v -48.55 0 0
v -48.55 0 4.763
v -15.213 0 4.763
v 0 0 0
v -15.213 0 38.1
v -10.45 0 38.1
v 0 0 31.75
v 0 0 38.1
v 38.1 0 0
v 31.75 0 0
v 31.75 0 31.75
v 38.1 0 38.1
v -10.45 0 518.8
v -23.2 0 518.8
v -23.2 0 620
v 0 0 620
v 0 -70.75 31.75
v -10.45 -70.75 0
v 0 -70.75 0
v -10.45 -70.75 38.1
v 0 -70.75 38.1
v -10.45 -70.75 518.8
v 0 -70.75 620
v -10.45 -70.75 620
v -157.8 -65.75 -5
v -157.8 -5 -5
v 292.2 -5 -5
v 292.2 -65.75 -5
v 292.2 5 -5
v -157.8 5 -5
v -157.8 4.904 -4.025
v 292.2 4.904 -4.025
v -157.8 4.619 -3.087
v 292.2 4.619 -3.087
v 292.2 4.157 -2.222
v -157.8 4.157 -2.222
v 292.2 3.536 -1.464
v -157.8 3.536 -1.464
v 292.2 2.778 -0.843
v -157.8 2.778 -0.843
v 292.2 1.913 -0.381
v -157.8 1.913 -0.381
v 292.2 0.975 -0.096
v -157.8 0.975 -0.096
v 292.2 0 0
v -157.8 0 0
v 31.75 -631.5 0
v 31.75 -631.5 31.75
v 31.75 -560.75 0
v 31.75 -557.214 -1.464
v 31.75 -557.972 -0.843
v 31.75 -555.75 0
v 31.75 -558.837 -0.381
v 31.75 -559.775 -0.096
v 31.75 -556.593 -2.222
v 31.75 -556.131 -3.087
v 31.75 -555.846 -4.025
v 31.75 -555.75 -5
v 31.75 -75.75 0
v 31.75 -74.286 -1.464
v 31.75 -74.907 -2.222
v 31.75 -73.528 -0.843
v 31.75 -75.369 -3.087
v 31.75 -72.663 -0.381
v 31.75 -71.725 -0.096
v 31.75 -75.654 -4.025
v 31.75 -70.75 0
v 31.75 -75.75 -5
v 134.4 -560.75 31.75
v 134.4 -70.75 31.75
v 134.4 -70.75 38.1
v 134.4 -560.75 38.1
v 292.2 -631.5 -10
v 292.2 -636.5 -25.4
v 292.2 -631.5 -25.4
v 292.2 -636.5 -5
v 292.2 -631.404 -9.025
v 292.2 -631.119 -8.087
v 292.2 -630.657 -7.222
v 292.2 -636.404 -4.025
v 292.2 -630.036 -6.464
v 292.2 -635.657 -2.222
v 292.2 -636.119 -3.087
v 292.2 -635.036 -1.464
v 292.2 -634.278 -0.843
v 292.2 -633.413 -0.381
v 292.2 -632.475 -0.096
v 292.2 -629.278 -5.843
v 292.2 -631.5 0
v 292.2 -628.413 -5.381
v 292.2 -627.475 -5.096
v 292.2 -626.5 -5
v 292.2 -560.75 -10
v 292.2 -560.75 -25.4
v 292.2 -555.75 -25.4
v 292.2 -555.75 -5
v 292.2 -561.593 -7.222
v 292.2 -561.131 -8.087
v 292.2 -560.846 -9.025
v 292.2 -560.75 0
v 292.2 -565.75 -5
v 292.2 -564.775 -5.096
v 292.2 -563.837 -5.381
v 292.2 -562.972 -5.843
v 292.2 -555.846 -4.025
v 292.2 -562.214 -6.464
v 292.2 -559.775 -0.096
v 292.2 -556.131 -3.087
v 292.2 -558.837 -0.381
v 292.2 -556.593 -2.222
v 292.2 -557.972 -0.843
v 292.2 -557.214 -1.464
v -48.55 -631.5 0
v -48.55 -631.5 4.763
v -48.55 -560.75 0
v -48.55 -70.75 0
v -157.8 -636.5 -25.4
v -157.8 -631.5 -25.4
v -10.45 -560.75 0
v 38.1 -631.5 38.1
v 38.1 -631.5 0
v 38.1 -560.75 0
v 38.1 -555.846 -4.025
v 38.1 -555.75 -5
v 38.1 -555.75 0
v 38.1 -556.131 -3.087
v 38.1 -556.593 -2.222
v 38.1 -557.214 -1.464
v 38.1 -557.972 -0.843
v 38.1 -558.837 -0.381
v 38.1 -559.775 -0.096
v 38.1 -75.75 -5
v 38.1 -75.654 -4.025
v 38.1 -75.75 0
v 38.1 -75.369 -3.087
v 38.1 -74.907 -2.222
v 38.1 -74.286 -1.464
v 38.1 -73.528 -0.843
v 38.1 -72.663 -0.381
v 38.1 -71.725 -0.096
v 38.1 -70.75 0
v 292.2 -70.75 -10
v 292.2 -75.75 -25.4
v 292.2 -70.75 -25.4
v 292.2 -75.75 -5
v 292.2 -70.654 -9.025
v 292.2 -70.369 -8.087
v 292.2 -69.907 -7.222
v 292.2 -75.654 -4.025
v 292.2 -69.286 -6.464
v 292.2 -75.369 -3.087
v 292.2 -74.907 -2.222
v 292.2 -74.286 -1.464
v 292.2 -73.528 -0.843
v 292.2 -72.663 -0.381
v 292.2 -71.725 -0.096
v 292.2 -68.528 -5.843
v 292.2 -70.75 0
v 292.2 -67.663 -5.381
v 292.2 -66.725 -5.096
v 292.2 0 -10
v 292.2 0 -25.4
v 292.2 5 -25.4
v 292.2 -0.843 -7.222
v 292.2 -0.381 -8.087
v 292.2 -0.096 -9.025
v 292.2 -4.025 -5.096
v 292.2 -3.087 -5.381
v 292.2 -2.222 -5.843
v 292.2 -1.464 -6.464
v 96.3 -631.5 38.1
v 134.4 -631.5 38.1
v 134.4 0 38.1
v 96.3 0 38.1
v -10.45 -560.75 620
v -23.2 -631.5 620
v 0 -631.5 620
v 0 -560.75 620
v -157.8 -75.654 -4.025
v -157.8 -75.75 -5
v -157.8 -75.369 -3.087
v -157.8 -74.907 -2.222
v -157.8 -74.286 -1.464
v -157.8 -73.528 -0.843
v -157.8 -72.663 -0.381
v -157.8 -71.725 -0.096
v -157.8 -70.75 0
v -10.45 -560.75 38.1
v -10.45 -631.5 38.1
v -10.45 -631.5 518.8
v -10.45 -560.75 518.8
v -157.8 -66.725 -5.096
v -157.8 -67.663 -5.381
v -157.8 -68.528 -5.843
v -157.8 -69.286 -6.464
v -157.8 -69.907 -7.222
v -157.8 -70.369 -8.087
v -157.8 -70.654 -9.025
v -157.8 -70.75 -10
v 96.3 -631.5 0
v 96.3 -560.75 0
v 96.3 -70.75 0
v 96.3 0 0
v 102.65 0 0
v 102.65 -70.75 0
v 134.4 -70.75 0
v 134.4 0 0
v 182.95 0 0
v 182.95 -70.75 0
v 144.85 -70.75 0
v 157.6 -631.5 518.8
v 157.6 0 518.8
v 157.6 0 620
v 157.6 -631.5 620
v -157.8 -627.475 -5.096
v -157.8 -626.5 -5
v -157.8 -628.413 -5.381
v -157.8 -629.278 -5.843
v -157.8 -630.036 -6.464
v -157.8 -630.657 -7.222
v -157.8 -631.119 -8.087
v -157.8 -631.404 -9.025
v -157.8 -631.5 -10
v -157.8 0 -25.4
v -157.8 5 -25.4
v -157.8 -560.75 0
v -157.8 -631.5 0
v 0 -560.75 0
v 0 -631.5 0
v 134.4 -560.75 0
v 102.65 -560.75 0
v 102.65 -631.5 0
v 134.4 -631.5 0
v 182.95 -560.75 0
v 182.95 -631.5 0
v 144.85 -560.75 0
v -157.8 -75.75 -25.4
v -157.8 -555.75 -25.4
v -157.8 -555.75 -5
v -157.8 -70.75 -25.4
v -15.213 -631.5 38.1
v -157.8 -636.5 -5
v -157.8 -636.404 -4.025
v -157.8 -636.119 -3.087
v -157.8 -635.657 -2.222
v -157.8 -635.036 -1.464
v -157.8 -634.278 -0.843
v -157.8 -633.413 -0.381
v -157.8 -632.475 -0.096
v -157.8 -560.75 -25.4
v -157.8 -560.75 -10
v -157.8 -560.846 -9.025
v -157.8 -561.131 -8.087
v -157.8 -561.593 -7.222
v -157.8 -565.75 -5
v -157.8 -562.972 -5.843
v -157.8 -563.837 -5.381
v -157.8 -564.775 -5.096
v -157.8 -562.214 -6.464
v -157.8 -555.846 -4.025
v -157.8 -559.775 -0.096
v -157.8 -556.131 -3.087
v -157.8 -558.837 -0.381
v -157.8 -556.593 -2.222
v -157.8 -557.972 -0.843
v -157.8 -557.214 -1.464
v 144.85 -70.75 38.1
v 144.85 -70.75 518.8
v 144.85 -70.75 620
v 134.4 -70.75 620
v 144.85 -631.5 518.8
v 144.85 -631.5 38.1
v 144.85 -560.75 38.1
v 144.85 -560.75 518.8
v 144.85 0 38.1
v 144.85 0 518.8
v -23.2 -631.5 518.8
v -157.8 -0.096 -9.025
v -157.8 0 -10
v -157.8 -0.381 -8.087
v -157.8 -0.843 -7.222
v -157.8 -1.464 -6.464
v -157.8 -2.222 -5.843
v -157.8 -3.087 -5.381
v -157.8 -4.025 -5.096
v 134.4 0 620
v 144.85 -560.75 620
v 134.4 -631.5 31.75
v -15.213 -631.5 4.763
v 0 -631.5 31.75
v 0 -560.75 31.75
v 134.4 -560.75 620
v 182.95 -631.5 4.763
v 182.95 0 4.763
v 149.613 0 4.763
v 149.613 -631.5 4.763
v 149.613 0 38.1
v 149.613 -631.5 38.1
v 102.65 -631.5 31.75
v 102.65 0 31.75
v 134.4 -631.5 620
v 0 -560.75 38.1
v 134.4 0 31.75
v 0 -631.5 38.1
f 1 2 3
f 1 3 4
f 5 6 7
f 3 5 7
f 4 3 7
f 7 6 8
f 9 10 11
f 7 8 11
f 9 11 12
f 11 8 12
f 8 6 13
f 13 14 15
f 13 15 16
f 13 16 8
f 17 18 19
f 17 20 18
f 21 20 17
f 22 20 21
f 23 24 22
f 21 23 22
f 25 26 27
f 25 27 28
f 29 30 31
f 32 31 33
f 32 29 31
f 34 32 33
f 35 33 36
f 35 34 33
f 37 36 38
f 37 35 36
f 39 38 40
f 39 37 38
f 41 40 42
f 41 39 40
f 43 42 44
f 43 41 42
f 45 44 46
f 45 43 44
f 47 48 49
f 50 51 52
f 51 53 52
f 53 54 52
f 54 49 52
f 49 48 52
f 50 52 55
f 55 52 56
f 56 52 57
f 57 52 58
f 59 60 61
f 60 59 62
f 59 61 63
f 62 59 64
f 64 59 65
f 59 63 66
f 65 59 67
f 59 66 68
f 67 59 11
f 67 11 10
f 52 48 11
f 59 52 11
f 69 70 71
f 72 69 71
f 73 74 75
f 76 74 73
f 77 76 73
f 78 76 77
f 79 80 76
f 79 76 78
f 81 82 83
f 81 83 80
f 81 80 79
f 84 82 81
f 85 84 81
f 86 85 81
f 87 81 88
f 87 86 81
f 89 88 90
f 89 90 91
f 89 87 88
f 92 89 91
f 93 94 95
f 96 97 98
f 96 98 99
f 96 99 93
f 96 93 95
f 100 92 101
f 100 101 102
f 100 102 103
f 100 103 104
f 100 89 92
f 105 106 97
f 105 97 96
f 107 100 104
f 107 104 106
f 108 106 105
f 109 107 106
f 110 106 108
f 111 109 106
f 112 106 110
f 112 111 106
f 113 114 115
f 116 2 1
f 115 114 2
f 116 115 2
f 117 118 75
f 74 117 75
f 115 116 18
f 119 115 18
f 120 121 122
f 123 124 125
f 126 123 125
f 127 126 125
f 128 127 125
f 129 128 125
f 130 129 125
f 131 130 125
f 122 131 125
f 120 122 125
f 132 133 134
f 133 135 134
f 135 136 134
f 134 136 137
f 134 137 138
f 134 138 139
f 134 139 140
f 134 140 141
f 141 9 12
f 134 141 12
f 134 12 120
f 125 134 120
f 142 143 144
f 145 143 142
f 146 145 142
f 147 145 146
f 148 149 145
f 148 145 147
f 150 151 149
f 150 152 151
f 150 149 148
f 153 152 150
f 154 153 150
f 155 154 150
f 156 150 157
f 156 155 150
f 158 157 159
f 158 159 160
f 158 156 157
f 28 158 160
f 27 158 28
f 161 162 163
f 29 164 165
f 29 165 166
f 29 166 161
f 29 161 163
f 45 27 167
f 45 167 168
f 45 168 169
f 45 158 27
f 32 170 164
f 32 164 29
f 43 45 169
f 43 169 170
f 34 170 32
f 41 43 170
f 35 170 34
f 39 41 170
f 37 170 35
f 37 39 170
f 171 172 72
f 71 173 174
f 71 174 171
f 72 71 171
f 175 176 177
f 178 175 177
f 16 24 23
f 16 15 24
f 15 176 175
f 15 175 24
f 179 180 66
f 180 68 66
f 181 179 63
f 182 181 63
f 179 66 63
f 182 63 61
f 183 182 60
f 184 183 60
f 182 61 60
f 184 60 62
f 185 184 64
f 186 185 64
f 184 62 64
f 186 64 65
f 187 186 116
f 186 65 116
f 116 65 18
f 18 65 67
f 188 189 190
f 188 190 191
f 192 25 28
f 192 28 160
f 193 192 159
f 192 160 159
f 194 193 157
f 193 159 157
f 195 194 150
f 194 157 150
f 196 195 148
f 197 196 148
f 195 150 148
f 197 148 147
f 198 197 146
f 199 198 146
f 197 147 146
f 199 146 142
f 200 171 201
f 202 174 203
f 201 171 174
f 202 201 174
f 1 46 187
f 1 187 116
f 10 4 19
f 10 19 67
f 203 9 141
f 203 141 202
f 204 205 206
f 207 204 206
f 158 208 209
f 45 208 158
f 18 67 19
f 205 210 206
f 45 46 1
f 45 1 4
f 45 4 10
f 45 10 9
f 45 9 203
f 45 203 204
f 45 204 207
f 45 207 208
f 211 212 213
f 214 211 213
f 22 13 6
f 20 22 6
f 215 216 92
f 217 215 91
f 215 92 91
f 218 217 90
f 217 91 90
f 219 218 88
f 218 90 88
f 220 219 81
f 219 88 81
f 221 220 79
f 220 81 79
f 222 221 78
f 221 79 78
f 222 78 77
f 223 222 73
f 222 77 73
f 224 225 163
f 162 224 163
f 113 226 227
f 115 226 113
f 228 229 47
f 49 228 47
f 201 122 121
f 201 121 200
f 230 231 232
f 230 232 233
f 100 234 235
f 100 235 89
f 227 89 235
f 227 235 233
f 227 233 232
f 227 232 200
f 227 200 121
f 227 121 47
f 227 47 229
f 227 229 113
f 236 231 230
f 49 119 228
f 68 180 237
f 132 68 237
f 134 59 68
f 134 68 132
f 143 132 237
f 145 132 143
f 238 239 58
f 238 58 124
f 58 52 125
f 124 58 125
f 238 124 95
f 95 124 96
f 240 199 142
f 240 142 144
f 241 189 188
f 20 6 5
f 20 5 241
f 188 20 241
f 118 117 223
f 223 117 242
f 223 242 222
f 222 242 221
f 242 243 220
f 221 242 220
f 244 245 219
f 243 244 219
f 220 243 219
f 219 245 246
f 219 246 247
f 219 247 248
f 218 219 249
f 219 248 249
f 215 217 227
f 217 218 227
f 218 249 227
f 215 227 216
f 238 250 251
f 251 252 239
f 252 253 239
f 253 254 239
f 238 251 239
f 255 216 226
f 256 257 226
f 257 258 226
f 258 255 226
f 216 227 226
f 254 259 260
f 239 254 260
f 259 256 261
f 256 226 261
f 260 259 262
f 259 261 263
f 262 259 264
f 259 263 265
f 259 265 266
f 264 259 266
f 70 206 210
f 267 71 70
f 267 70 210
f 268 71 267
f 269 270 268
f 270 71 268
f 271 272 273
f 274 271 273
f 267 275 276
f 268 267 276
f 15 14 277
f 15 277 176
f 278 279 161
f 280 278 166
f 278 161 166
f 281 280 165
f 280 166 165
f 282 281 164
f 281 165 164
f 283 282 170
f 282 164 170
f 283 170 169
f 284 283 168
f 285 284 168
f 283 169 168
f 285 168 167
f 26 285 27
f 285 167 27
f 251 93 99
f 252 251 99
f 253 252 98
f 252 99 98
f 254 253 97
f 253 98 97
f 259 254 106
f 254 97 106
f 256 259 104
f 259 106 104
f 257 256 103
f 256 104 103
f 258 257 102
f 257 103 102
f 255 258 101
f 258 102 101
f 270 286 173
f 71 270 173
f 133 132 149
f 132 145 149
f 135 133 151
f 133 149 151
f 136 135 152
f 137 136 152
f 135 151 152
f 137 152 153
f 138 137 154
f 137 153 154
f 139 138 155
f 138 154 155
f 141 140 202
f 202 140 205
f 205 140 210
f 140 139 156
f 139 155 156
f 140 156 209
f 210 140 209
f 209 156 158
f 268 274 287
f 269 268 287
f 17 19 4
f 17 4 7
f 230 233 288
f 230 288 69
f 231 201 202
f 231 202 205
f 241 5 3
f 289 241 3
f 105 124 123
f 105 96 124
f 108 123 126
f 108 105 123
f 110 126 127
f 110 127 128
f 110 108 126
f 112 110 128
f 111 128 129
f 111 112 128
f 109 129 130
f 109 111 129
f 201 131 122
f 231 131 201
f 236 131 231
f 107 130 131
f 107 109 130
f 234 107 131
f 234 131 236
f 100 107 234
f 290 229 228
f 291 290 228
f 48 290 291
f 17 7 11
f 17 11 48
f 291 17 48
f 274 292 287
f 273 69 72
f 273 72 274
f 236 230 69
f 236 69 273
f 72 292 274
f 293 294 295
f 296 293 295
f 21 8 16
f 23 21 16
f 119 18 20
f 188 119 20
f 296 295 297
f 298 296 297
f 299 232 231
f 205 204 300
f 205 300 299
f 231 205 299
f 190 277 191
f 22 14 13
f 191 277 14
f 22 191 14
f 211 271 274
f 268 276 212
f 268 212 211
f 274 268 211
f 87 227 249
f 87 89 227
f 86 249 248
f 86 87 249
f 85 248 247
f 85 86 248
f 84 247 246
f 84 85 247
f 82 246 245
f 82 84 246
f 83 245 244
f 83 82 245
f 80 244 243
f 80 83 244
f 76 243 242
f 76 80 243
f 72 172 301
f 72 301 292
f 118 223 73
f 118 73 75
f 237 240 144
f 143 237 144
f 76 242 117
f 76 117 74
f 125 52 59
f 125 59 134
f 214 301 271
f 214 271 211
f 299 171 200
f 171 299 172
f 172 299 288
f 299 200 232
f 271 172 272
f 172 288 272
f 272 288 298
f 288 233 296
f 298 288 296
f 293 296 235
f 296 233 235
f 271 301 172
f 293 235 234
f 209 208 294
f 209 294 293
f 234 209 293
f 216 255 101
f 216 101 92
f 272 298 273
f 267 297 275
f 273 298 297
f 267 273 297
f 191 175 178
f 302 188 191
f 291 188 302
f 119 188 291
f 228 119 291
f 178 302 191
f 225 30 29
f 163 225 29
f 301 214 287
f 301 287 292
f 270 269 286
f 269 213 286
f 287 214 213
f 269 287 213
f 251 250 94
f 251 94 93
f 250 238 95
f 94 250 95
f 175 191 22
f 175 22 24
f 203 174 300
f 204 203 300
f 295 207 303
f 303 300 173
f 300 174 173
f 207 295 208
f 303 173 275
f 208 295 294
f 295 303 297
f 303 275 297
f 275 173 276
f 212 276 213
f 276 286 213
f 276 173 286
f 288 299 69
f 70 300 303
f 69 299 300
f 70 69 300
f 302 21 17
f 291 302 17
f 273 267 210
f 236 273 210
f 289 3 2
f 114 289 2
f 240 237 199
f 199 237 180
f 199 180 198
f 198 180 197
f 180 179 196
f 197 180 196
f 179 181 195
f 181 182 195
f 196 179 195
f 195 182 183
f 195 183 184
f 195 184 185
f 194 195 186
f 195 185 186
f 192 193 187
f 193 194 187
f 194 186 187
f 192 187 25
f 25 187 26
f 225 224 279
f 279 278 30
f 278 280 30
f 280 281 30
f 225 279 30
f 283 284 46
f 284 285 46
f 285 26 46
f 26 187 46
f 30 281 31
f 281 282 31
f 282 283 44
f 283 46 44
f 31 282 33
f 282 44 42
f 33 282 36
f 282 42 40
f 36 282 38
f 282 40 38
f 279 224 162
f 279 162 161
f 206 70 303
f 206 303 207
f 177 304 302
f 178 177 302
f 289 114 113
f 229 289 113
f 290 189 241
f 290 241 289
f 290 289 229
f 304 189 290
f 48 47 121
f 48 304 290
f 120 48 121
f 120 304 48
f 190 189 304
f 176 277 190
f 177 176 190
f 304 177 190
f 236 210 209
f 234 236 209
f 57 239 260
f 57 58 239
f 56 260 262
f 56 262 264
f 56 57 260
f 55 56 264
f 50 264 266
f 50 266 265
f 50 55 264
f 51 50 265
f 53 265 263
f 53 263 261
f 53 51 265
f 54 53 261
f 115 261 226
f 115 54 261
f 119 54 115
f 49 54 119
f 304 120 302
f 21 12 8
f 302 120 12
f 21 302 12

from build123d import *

# Parameters (mm, degrees)
F1_DEPTH  = 631.5
F2_DEPTH  = 70.75
F3_W      = 10.45
F3_H      = 70.75
F4_DEPTH  = 620
F5_W      = 450
F5_H      = 80.75
F6_DEPTH  = 25.4
F7_R      = 4.99999
F9_DEPTH  = 631.5
F10_DEPTH = 70.75
F11_W     = 10.45
F11_H     = 70.75
F12_DEPTH = 620
F13_W     = 12.75
F13_H     = 101.2
F14_DEPTH = 631.5
F16_DEPTH = 631.5
F18_DEPTH = 300
F19_DEPTH = 300


# Not quite as in the source:
# - a fillet or chamfer is up to 0.001 mm smaller than in the source, because OpenCascade refuses the exact size


with BuildPart() as f1:
    # F0 (on Front) → F1 (new body)
    with BuildSketch(Plane.XZ):
        Polygon((0, 38.1), (0, 31.75), (31.75, 31.75), (31.75, 0), (38.1, 0), (38.1, 38.1), align=None)
    extrude(amount=F1_DEPTH)

    # F0 (on Front) → F2 (join)
    with BuildSketch(Plane.XZ):
        Polygon((-10.45, 0), (0, 0), (0, 31.75), (0, 38.1), (0, 620), (-10.45, 620), align=None)
    extrude(amount=F2_DEPTH)

    # F3 (on Top) → F4 (join)
    with BuildSketch(Plane.XY):
        with Locations((-5.225, -596.125)):
            Rectangle(F3_W, F3_H)
    extrude(amount=F4_DEPTH)

    # F5 (on Top) → F6 (join)
    with BuildSketch(Plane.XY):
        with Locations((67.2, -35.375)):
            Rectangle(F5_W, F5_H)
        with Locations((67.2, -596.125)):
            Rectangle(F5_W, F5_H)
    extrude(amount=-F6_DEPTH)

    # F7 (radius 5 in the source; OpenCascade refuses exactly that, so slightly less here)
    f7_edges = [f1.edges().sort_by_distance(p)[0] for p in [
        (67.2, -636.5, 0),
        (165.15, -555.75, 0),
        (165.15, -75.75, 0),
        (67.2, 5, 0),
        (-63.025, -75.75, 0),
        (-63.025, -555.75, 0),
    ]]
    fillet(f7_edges, radius=F7_R)

    # F8 (on Front) → F9 (join)
    with BuildSketch(Plane.XZ):
        Polygon((102.65, 31.75), (134.4, 31.75), (134.4, 38.1), (96.3, 38.1), (96.3, 0), (102.65, 0), align=None)
    extrude(amount=F9_DEPTH)

    # F8 (on Front) → F10 (join)
    with BuildSketch(Plane.XZ):
        Polygon((134.4, 31.75), (134.4, 0), (144.85, 0), (144.85, 620), (134.4, 620), (134.4, 38.1), align=None)
        Polygon((102.65, 31.75), (134.4, 31.75), (134.4, 38.1), (96.3, 38.1), (96.3, 0), (102.65, 0), align=None)
    extrude(amount=F10_DEPTH)

    # F11 (on Top) → F12 (join)
    with BuildSketch(Plane.XY):
        with Locations((139.625, -596.125)):
            Rectangle(F11_W, F11_H)
    extrude(amount=F12_DEPTH)

    # F13 (on Front) → F14 (join)
    with BuildSketch(Plane.XZ):
        with Locations((-16.825, 569.4)):
            Rectangle(F13_W, F13_H)
        with Locations((151.225, 569.4)):
            Rectangle(F13_W, F13_H)
    extrude(amount=F14_DEPTH)

    # F15 (on Front) → F16 (join)
    with BuildSketch(Plane.XZ):
        Polygon((-48.55, 4.763), (-48.55, 0), (-10.45, 0), (-10.45, 38.1), (-15.213, 38.1), (-15.213, 4.763), align=None)
        Polygon((144.85, 0), (182.95, 0), (182.95, 4.763), (149.613, 4.763), (149.613, 38.1), (144.85, 38.1), align=None)
    extrude(amount=F16_DEPTH)

    # F17 (on Right) → F18 (cut)
    with BuildSketch(Plane.YZ):
        with BuildLine():
            Line((-631.5, -10), (-631.5, -25.4))
            Line((-631.5, -25.4), (-560.75, -25.4))
            Line((-560.75, -25.4), (-560.75, -10))
            ThreePointArc((-560.75, -10), (-562.2144660941, -6.4644660941), (-565.75, -5))
            Line((-565.75, -5), (-626.5, -5))
            ThreePointArc((-626.5, -5), (-630.0355339059, -6.4644660941), (-631.5, -10))
        make_face()
        with BuildLine():
            Line((-5, -5), (-65.75, -5))
            ThreePointArc((-65.75, -5), (-69.2855339059, -6.4644660941), (-70.75, -10))
            Line((-70.75, -10), (-70.75, -25.4))
            Line((-70.75, -25.4), (0, -25.4))
            Line((0, -25.4), (0, -10))
            ThreePointArc((0, -10), (-1.4644660941, -6.4644660941), (-5, -5))
        make_face()
    extrude(amount=F18_DEPTH, mode=Mode.SUBTRACT)

    # F17 (on Right) → F19 (cut)
    with BuildSketch(Plane.YZ):
        with BuildLine():
            Line((-631.5, -10), (-631.5, -25.4))
            Line((-631.5, -25.4), (-560.75, -25.4))
            Line((-560.75, -25.4), (-560.75, -10))
            ThreePointArc((-560.75, -10), (-562.2144660941, -6.4644660941), (-565.75, -5))
            Line((-565.75, -5), (-626.5, -5))
            ThreePointArc((-626.5, -5), (-630.0355339059, -6.4644660941), (-631.5, -10))
        make_face()
        with BuildLine():
            Line((-5, -5), (-65.75, -5))
            ThreePointArc((-65.75, -5), (-69.2855339059, -6.4644660941), (-70.75, -10))
            Line((-70.75, -10), (-70.75, -25.4))
            Line((-70.75, -25.4), (0, -25.4))
            Line((0, -25.4), (0, -10))
            ThreePointArc((0, -10), (-1.4644660941, -6.4644660941), (-5, -5))
        make_face()
    extrude(amount=-F19_DEPTH, mode=Mode.SUBTRACT)


solid = f1.part
